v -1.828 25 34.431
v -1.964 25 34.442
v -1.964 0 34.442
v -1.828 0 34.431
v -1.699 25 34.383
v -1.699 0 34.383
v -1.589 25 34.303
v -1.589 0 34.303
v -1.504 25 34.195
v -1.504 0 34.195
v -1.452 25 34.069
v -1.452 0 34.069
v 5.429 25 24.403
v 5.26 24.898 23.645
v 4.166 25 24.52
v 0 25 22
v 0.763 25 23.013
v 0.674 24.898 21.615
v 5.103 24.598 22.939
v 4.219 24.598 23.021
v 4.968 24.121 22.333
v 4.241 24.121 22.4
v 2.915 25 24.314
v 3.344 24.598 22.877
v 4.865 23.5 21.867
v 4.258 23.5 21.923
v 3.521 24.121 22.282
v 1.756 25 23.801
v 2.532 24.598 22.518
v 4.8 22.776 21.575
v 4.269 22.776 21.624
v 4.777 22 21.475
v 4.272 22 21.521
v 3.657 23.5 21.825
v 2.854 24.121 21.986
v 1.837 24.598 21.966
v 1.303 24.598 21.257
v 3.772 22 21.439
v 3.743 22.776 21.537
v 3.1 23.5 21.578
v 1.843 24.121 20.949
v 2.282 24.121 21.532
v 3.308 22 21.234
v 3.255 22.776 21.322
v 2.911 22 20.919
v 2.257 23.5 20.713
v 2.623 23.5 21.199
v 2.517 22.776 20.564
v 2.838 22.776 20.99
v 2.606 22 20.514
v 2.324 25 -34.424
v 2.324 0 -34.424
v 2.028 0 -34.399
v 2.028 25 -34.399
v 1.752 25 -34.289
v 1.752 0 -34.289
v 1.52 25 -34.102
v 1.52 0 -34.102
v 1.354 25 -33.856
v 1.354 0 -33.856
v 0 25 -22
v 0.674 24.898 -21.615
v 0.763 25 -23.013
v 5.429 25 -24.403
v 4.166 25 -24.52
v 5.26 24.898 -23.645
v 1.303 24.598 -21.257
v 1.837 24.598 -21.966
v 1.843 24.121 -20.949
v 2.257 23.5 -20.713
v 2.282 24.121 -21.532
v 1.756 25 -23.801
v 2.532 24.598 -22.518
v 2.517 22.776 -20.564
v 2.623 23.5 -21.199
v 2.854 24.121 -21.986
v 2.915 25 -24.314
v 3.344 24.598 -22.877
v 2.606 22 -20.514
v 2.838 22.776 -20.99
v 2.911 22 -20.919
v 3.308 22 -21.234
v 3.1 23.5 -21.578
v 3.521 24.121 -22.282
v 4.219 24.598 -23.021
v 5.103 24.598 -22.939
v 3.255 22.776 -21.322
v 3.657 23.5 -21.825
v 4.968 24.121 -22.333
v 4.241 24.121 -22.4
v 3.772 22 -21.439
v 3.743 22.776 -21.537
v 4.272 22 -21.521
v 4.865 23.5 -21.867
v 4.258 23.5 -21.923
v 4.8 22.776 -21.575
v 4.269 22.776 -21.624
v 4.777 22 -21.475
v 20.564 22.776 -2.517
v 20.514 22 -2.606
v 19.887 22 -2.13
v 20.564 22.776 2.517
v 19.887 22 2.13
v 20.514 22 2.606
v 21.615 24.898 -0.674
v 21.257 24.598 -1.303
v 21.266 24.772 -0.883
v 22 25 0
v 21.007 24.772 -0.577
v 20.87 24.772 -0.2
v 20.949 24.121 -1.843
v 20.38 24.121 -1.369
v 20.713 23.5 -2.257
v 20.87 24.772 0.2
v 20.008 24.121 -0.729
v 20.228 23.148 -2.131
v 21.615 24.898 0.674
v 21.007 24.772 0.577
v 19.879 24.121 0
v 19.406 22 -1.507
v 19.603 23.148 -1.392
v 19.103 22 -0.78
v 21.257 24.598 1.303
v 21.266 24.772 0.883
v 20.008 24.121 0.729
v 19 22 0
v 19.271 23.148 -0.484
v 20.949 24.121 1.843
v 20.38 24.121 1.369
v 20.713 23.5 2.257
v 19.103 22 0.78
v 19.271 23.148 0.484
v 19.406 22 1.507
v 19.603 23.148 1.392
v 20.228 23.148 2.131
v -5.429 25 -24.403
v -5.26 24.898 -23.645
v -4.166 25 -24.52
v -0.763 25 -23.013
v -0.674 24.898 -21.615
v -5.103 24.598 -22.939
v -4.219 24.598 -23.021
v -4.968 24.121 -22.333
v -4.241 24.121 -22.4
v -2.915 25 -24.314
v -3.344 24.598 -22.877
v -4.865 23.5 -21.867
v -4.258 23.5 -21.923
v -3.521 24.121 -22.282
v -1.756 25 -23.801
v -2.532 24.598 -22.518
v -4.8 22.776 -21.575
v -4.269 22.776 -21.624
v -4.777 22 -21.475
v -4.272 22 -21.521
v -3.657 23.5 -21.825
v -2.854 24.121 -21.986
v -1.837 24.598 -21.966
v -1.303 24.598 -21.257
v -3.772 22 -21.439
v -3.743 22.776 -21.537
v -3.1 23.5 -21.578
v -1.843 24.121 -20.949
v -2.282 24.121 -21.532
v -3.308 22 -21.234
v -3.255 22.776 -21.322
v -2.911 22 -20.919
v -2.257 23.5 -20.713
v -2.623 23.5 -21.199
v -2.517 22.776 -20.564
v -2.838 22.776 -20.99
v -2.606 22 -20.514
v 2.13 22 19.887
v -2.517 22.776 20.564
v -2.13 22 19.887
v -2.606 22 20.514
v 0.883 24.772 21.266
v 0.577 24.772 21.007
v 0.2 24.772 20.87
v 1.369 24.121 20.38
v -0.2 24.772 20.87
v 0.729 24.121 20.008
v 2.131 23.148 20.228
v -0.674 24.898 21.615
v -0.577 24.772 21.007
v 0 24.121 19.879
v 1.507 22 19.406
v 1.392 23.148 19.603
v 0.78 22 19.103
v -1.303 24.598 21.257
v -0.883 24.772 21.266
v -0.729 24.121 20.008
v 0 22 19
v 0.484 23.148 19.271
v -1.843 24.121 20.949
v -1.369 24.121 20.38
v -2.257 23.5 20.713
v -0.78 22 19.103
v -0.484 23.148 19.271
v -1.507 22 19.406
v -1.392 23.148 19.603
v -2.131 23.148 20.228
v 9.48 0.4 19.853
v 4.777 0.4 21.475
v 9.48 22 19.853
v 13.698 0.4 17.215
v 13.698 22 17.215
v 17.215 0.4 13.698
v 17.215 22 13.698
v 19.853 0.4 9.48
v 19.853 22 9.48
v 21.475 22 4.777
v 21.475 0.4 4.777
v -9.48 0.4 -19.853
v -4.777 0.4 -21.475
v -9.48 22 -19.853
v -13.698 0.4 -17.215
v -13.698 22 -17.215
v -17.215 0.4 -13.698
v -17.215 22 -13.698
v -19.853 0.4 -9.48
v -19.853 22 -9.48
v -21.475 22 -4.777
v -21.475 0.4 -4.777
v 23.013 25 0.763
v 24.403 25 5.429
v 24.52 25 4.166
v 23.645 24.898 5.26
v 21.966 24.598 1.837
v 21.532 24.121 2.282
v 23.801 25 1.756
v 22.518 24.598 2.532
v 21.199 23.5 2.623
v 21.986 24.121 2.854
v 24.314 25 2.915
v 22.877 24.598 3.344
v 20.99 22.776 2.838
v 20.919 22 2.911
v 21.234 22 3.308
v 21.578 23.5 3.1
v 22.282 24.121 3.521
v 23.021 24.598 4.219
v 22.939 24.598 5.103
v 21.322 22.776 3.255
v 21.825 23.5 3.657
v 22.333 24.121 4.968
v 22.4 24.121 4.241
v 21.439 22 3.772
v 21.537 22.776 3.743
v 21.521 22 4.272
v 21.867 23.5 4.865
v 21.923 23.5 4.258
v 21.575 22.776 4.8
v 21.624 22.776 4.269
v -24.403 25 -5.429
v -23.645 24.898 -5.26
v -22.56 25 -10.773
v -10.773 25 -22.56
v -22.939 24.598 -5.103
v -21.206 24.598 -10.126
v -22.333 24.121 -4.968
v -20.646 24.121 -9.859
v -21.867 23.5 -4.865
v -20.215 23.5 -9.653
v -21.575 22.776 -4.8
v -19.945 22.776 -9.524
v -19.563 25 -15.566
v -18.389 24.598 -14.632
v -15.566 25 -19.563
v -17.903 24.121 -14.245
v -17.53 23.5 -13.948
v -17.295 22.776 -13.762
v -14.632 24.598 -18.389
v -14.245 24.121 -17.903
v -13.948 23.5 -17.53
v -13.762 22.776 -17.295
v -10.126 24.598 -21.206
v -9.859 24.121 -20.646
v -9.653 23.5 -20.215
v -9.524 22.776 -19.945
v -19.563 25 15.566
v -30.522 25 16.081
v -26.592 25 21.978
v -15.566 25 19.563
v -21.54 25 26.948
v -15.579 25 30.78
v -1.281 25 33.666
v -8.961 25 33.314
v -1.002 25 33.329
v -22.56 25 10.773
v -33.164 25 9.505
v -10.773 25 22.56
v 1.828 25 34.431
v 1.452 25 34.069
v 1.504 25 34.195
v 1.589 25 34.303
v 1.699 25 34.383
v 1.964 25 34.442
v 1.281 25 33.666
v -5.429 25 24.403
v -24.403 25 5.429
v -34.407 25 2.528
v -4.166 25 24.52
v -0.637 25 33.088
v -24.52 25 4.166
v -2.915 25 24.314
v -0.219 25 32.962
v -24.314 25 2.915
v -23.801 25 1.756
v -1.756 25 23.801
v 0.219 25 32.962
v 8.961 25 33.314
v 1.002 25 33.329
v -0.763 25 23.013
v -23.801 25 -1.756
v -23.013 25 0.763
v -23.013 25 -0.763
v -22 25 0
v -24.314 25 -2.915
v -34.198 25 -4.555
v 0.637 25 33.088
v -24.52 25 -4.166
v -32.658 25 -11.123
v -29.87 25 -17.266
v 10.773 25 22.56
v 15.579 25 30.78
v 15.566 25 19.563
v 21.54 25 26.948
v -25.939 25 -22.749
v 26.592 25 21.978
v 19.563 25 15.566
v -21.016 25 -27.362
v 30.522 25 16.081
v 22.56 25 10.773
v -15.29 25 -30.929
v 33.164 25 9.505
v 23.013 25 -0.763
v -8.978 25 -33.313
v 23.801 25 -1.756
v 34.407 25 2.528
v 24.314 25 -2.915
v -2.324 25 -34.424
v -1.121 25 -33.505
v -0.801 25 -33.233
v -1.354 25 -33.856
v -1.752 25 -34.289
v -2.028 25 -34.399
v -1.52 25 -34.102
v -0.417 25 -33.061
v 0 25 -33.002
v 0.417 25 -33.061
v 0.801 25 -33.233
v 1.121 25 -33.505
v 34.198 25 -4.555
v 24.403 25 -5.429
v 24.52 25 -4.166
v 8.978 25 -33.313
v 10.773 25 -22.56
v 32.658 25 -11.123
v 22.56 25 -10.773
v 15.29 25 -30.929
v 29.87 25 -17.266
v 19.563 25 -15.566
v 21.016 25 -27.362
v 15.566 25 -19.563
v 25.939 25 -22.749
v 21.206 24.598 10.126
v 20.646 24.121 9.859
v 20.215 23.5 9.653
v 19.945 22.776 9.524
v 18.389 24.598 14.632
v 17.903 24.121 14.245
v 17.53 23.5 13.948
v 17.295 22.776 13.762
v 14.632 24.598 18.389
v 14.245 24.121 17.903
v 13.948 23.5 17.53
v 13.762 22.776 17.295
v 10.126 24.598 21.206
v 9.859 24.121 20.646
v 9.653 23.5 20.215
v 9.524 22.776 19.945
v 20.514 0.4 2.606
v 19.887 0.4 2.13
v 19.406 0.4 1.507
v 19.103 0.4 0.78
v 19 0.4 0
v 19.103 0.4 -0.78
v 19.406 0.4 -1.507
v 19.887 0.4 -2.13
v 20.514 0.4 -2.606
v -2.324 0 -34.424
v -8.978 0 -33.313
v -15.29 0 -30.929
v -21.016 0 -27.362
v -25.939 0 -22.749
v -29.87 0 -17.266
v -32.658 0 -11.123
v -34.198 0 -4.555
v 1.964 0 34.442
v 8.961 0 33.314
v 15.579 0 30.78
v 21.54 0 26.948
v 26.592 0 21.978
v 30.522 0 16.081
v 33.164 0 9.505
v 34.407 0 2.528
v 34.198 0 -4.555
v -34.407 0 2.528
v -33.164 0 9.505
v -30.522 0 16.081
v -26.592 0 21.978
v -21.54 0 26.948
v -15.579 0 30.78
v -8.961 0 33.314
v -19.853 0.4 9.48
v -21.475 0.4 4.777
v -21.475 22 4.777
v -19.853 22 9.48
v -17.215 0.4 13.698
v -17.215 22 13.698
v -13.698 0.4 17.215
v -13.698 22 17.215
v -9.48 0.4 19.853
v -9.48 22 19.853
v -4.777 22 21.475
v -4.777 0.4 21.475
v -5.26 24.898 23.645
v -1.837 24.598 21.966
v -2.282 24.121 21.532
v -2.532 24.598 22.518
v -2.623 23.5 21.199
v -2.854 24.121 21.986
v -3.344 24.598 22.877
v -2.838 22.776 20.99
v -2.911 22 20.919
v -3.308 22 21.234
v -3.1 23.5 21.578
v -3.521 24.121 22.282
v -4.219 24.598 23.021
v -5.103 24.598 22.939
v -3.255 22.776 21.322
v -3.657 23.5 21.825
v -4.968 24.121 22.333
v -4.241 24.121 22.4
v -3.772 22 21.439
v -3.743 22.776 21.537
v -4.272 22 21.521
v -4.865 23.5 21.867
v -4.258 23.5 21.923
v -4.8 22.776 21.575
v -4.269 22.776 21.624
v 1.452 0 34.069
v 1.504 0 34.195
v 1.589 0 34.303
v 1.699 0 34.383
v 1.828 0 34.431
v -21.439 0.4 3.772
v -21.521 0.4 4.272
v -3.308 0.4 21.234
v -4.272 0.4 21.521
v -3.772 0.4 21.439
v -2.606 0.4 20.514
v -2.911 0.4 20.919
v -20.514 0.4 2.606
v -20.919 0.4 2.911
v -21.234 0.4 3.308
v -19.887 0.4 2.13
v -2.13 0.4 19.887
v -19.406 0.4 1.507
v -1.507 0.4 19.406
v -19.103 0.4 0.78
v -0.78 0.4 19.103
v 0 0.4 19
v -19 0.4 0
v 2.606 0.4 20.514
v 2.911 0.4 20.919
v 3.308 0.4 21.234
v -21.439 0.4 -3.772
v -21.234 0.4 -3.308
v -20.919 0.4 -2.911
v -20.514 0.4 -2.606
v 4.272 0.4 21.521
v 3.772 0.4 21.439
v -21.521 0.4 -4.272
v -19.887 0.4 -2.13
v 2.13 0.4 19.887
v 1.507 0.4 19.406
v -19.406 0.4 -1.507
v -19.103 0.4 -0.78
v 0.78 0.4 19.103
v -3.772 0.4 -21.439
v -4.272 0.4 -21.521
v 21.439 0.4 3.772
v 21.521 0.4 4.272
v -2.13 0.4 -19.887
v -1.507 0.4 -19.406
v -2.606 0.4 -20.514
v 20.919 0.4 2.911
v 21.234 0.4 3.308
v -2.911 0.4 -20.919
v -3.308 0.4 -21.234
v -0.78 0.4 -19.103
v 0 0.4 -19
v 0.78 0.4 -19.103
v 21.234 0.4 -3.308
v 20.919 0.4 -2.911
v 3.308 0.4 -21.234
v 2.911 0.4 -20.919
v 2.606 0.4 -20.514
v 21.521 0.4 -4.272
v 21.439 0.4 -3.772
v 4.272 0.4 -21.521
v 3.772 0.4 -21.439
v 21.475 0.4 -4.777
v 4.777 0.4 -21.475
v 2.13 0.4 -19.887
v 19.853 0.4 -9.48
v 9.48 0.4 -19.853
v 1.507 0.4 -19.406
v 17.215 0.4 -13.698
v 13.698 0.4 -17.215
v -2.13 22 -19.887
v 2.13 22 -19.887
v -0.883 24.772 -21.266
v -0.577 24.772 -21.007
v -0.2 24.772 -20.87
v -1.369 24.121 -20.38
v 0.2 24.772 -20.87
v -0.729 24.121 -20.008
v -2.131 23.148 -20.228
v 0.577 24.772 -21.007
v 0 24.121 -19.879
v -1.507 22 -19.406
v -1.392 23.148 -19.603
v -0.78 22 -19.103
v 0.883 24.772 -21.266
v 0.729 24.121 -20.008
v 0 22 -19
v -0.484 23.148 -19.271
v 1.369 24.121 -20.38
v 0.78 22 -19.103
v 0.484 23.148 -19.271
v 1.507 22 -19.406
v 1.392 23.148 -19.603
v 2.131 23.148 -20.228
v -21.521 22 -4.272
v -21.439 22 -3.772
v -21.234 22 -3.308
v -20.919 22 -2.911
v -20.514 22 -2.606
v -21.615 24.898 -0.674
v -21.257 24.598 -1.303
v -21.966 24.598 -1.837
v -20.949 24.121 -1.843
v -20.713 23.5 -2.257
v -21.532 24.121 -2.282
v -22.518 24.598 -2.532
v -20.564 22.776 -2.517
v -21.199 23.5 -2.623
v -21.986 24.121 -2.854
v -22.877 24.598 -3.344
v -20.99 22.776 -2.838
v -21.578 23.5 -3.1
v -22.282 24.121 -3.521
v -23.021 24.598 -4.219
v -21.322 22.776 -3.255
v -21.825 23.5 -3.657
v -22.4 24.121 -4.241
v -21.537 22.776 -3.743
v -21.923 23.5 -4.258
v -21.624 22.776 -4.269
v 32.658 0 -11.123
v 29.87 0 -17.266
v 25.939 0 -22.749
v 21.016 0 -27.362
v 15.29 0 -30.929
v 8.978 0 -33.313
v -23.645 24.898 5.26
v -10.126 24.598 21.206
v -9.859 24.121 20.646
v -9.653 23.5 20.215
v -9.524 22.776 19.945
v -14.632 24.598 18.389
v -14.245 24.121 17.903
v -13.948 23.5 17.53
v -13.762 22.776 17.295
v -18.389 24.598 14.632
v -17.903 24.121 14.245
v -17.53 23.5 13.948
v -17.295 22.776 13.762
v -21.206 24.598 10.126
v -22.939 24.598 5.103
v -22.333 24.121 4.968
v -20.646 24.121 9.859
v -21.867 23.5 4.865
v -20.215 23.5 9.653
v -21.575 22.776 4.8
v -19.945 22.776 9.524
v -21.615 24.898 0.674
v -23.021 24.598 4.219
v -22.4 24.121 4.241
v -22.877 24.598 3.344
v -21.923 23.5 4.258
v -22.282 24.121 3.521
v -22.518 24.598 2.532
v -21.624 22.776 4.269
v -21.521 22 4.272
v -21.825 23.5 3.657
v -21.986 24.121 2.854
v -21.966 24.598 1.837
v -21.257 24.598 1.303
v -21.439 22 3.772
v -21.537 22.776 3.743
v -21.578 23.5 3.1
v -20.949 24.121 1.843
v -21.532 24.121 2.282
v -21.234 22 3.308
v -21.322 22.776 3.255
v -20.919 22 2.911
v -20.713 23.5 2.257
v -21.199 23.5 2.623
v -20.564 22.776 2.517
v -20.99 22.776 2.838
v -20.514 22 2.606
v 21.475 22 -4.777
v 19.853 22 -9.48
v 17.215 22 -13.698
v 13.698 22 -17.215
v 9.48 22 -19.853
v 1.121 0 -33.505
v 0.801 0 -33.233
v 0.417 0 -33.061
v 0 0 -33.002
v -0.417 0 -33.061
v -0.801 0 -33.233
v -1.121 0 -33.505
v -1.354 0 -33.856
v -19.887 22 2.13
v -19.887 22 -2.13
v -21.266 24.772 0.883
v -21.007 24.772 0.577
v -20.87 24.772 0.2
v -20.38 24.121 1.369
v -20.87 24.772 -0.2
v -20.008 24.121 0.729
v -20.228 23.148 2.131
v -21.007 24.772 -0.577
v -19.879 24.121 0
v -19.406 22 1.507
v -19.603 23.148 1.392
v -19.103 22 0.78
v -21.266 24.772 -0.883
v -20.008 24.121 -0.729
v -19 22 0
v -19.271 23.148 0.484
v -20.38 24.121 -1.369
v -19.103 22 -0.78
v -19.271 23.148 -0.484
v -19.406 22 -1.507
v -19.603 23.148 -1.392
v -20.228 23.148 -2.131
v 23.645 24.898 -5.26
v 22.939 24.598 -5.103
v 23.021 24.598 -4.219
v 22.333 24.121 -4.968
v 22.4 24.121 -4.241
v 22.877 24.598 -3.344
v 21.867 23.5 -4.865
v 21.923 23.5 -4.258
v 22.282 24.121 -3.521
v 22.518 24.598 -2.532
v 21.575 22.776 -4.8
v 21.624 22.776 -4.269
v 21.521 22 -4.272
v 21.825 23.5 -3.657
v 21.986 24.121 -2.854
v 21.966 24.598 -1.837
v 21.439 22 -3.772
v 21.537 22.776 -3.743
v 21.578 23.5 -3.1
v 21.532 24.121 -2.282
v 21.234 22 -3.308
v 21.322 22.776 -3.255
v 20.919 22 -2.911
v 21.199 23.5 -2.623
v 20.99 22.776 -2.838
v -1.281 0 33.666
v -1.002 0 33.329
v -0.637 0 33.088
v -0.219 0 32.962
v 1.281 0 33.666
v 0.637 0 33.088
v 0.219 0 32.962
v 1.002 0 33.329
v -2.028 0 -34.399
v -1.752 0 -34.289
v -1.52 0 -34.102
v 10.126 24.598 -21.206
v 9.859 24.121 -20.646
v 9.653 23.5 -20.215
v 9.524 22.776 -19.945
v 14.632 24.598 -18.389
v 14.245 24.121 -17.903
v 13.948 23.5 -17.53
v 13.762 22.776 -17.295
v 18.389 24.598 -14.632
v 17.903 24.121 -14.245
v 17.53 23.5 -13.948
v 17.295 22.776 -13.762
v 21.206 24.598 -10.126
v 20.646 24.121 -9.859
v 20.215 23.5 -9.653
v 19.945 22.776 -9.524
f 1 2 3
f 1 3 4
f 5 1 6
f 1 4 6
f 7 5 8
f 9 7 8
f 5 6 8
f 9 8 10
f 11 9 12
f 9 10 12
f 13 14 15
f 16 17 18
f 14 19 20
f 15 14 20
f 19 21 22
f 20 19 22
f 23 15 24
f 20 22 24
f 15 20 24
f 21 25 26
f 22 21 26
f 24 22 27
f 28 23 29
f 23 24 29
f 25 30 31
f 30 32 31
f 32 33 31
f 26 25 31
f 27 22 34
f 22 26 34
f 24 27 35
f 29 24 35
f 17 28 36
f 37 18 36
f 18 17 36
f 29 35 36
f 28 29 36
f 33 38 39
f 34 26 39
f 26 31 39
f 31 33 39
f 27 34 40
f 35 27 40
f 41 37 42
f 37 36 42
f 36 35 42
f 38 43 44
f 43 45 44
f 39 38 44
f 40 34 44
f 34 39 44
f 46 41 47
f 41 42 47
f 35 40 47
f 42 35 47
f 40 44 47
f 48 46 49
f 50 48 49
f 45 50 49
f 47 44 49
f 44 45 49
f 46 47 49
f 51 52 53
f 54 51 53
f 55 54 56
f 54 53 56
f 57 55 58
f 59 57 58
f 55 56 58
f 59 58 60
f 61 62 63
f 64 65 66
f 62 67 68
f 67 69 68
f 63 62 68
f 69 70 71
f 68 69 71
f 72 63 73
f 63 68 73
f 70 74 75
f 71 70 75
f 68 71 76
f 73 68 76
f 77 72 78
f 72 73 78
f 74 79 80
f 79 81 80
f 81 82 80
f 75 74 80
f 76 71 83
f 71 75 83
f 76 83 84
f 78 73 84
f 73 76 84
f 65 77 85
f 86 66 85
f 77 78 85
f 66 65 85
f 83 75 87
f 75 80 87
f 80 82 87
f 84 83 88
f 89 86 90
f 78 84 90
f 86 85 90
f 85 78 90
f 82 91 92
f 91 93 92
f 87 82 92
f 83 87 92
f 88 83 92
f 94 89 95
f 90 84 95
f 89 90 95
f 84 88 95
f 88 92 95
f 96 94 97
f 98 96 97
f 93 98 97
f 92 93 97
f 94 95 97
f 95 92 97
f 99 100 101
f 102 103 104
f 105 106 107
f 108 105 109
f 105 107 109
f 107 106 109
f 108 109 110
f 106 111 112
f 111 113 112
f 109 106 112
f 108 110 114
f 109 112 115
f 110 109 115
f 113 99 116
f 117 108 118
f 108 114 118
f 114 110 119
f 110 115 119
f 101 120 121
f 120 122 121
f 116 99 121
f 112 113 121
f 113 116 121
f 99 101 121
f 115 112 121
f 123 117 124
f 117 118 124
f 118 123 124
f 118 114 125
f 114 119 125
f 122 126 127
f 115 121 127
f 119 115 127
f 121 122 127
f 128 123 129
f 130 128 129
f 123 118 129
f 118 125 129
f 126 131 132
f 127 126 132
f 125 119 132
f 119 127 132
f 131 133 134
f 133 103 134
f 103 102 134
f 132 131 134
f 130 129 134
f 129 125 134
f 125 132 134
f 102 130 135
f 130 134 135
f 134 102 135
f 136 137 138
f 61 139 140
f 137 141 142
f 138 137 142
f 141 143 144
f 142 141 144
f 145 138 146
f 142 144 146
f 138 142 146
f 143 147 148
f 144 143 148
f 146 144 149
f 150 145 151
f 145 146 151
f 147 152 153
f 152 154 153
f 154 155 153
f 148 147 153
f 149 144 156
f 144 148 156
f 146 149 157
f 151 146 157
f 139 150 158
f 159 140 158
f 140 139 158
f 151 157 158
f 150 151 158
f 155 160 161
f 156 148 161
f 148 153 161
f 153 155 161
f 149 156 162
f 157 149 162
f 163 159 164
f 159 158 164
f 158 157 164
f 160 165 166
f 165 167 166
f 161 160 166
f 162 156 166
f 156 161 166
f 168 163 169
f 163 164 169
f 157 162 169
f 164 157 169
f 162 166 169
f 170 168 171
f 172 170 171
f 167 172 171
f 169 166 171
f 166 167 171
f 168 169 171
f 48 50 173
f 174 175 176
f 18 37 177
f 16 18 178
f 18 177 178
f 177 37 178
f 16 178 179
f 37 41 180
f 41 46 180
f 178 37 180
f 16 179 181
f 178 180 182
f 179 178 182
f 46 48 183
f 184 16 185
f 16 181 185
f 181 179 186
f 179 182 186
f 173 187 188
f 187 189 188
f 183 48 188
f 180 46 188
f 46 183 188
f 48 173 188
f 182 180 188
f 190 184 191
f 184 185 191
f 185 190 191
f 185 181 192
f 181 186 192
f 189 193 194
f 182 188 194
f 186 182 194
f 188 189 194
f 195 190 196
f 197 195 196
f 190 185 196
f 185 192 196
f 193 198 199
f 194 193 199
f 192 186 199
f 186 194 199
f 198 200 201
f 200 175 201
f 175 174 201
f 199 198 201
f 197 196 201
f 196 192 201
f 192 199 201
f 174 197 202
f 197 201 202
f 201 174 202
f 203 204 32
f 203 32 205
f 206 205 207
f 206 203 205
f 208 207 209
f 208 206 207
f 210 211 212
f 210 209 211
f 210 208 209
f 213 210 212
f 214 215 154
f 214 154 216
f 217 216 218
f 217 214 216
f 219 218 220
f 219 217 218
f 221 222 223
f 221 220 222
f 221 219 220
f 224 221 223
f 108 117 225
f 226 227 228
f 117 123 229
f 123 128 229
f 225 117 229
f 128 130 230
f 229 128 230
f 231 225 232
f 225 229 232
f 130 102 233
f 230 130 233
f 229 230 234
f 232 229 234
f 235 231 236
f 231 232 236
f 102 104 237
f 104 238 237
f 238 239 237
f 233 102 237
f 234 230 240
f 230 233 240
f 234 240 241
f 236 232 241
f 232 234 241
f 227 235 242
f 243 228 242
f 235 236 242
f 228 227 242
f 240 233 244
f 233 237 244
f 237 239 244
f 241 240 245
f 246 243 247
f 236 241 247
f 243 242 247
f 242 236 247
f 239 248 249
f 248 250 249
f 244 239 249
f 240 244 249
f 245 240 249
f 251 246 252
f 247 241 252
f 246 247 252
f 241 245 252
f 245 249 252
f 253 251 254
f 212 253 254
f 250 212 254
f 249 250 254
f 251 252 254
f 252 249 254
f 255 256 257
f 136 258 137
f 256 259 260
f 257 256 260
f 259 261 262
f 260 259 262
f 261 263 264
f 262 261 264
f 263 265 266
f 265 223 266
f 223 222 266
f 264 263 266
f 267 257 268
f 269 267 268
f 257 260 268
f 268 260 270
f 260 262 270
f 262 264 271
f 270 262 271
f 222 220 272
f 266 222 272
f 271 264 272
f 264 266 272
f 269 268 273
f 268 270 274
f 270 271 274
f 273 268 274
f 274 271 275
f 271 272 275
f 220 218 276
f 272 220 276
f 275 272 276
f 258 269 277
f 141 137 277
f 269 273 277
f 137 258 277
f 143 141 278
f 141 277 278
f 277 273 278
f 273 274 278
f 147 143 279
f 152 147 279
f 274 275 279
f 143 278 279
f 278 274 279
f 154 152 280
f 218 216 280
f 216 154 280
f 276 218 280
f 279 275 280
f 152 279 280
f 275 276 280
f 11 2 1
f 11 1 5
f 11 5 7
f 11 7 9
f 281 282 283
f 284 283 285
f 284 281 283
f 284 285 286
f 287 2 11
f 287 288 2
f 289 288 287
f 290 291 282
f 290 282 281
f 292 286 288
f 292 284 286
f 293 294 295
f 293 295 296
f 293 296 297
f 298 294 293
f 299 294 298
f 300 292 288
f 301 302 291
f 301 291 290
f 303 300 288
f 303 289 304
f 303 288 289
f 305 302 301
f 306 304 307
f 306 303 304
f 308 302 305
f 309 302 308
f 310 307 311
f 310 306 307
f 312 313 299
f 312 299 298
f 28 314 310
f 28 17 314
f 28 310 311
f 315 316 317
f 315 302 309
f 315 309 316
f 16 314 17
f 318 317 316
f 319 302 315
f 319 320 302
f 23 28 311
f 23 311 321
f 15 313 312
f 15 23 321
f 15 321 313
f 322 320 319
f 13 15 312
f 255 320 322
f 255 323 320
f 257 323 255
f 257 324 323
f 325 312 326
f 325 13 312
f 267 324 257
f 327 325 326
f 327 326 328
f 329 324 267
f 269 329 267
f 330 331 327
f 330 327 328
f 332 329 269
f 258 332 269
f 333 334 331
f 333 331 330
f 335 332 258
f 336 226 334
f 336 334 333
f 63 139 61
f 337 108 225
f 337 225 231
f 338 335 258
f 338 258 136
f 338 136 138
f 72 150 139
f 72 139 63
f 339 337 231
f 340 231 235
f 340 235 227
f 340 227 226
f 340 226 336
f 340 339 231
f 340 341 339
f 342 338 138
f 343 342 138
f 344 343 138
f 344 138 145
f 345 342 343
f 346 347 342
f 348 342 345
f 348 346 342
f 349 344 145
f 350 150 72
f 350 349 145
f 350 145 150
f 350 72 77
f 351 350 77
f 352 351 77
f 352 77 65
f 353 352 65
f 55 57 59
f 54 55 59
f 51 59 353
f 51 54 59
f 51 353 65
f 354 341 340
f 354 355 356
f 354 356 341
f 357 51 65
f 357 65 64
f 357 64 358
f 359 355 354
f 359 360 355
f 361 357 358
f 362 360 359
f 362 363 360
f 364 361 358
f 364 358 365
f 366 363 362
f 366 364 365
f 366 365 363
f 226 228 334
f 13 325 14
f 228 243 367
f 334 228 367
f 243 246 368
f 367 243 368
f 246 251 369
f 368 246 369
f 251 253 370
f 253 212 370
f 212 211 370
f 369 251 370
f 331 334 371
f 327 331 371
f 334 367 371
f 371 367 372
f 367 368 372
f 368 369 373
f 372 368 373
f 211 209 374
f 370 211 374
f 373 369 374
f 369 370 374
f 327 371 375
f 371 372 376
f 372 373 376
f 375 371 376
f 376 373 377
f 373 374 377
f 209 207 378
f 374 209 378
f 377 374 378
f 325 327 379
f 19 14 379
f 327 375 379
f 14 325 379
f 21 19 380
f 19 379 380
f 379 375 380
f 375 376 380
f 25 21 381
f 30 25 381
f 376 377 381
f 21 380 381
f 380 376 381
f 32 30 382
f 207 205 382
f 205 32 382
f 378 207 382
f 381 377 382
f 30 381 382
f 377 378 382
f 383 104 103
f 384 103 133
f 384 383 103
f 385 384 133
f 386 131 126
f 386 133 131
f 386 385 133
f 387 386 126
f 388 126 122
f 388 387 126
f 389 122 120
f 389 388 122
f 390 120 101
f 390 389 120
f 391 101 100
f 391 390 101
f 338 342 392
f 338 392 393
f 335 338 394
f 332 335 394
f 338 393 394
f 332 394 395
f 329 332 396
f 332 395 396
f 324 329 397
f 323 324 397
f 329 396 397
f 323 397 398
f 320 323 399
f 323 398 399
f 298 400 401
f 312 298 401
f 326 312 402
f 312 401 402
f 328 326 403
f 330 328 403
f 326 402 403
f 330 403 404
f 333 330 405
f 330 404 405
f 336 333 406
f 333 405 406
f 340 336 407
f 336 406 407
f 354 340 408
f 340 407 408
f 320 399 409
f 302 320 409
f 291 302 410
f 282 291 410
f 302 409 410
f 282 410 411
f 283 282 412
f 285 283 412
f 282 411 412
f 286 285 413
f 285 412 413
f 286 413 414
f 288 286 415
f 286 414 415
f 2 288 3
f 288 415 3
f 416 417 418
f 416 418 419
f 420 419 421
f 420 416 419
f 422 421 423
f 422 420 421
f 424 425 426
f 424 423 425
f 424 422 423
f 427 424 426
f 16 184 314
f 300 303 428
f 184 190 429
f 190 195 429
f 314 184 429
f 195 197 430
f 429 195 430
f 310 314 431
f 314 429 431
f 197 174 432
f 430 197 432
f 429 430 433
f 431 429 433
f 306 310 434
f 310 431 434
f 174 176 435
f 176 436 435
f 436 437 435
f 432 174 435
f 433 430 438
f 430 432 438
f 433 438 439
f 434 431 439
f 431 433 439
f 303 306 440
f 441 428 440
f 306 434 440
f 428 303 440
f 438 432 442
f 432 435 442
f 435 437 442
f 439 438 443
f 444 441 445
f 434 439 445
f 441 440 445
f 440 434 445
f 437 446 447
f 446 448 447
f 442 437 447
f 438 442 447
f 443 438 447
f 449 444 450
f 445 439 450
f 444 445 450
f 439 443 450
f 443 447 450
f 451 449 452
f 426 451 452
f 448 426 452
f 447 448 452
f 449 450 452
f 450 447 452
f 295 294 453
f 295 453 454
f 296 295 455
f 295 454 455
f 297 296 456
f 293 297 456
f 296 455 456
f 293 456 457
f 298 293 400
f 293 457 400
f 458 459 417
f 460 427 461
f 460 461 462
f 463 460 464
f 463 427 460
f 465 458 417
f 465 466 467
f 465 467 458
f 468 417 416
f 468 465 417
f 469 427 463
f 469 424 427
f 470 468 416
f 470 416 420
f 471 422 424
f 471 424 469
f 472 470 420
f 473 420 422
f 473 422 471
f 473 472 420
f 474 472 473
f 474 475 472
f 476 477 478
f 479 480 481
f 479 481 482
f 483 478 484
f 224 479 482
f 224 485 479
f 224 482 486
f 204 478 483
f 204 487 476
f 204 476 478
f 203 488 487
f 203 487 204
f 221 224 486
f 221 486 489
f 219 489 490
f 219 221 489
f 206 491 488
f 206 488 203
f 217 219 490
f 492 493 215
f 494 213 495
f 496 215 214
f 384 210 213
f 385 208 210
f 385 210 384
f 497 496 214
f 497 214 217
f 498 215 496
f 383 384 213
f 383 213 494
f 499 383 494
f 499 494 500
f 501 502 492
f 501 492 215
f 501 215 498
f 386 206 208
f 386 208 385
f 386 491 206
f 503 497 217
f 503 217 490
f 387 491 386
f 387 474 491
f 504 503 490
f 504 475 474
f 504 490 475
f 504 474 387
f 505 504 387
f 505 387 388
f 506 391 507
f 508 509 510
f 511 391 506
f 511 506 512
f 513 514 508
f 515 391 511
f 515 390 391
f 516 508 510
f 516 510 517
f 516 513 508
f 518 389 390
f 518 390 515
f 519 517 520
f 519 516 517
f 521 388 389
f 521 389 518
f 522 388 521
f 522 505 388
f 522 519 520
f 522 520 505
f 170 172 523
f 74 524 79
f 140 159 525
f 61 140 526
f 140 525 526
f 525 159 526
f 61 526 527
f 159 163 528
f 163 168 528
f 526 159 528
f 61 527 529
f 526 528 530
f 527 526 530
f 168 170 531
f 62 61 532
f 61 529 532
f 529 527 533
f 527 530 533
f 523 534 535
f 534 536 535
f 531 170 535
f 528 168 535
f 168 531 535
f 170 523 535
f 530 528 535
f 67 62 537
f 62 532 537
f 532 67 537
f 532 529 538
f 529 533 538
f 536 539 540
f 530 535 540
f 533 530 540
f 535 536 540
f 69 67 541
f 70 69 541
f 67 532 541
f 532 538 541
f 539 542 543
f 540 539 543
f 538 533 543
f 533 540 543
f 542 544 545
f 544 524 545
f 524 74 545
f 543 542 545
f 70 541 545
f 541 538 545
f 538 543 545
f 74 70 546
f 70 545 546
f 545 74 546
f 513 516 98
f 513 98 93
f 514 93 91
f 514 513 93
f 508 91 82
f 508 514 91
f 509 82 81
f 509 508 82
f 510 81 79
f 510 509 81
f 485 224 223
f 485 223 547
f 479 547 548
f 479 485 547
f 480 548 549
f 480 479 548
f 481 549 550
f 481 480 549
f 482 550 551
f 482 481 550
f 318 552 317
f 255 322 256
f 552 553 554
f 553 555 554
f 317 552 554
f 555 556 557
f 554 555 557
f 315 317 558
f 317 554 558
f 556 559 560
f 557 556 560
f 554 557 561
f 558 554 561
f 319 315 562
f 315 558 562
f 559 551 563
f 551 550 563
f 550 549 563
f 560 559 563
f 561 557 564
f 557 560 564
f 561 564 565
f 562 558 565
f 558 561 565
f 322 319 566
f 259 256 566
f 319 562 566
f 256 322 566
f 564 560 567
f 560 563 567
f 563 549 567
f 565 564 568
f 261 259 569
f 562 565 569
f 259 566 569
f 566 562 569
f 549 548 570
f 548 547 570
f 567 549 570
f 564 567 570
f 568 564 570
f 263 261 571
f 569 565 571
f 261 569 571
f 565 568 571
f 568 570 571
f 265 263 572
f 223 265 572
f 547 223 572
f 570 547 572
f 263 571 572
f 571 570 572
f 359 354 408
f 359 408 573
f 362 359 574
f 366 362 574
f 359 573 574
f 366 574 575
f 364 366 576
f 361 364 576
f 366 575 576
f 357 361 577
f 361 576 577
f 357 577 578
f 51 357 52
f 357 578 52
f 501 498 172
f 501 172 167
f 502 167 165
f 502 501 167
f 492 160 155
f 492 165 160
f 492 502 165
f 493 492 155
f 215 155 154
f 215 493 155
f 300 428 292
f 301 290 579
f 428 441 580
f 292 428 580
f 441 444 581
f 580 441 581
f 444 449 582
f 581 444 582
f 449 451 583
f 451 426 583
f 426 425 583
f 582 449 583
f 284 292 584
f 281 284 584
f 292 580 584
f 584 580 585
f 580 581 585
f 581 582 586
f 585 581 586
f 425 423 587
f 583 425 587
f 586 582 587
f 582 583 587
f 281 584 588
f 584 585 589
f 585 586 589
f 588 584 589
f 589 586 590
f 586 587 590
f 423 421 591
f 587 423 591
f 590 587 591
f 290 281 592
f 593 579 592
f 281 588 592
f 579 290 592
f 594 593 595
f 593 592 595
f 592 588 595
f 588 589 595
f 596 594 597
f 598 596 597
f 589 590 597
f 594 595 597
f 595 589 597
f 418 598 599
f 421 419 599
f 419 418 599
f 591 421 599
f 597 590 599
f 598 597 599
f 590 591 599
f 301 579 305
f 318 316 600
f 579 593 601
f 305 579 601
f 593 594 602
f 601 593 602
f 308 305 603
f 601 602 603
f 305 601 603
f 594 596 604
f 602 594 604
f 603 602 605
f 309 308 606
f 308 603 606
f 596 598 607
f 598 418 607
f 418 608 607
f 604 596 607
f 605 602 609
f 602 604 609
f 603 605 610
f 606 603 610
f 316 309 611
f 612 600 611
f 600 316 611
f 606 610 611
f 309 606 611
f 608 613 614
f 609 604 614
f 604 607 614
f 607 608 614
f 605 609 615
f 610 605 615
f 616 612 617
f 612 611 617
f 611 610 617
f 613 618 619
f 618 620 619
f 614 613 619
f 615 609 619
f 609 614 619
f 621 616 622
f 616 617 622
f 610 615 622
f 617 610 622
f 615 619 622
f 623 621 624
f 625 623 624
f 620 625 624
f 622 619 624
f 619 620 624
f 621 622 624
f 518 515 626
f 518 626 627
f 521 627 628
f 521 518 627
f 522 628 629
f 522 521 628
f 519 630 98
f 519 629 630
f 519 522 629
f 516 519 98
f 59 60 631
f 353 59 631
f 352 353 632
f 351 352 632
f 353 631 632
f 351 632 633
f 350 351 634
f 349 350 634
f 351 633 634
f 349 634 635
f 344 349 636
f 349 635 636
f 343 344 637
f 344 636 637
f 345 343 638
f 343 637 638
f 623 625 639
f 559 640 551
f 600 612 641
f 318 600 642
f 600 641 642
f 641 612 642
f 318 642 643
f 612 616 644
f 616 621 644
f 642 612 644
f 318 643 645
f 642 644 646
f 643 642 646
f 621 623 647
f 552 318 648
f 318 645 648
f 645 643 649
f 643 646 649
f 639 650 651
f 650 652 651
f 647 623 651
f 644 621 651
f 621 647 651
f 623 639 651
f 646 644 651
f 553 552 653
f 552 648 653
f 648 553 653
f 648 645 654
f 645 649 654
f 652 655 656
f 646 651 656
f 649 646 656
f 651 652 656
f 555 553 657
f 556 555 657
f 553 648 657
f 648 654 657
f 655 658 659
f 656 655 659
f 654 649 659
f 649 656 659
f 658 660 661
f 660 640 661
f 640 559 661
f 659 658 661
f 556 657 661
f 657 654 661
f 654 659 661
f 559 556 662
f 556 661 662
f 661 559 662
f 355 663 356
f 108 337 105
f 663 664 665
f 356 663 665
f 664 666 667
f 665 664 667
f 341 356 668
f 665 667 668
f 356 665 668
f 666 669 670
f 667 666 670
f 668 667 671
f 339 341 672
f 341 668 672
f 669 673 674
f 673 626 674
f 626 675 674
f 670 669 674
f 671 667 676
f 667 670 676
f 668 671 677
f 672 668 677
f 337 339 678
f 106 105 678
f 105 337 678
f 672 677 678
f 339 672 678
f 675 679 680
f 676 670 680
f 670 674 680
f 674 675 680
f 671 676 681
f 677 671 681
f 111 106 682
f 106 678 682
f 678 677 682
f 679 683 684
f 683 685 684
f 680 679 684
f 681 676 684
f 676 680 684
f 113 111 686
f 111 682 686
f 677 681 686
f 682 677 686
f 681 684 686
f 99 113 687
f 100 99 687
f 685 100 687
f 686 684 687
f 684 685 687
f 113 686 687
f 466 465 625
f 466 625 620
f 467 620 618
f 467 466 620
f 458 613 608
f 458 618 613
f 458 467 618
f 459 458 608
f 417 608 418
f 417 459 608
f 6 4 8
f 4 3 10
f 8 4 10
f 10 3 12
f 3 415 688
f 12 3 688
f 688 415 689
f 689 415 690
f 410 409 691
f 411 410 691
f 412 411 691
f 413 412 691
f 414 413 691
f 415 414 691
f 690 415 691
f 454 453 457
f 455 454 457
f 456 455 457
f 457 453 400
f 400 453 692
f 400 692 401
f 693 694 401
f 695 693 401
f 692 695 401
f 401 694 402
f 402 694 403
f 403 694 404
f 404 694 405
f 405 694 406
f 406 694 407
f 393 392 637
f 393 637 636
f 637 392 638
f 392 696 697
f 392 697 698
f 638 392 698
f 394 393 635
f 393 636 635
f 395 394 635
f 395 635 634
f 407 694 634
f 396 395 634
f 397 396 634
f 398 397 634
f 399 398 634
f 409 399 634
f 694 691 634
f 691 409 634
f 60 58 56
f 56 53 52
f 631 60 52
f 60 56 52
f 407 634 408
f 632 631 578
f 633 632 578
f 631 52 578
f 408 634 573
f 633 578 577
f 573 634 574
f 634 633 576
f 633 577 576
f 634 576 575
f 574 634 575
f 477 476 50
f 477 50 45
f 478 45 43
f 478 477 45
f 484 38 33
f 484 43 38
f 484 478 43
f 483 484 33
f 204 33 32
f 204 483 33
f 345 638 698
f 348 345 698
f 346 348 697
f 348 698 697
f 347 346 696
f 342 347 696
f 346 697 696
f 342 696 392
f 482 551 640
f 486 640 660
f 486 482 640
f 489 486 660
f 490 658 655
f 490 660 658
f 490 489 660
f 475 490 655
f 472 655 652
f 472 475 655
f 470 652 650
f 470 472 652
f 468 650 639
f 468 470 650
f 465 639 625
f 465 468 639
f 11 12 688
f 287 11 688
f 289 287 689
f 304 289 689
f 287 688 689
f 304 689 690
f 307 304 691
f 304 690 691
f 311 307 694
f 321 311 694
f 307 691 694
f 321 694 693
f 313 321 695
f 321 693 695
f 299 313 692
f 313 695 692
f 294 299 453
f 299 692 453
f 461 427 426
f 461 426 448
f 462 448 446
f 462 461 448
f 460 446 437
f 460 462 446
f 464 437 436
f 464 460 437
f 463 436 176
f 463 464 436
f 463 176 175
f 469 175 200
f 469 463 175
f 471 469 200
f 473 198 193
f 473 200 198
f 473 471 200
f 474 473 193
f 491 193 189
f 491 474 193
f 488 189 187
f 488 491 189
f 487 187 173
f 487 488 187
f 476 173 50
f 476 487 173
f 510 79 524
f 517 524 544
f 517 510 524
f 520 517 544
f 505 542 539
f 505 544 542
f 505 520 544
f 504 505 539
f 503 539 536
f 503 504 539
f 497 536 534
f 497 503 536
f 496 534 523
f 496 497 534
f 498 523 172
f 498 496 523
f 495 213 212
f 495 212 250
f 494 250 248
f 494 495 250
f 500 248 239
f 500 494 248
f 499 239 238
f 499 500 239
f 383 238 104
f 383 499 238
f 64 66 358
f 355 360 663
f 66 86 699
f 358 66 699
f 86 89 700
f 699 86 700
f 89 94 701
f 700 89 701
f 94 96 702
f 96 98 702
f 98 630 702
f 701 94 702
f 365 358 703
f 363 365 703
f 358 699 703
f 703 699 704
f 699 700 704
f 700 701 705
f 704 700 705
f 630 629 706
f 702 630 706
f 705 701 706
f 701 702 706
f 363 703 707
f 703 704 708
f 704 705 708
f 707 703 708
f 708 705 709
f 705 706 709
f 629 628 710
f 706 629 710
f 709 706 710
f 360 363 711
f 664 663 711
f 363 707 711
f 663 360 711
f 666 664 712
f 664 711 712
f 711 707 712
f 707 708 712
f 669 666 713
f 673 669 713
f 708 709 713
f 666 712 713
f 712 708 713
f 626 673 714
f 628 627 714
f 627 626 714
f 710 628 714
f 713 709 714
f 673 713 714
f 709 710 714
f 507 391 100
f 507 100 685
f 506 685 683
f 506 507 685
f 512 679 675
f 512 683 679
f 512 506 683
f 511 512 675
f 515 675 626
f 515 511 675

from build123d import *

# Parameters (mm, degrees)
BOSS_EXTRUDE1_DEPTH = 25
CUT_EXTRUDE2_DEPTH  = 26
BOSS_EXTRUDE2_DEPTH = 0.4
FILLET1_R           = 3


with BuildPart() as part:
    # Sketch1 → Boss-Extrude1 (new body)
    with BuildSketch(Plane(origin=(0, 0, 0), x_dir=(1, 0, 0), z_dir=(0, 1, 0))):
        with BuildLine():
            ThreePointArc((1.451818925, -34.068556857), (1.641248992, -34.346908706), (1.964225605, -34.442038138))
            ThreePointArc((1.964225605, -34.442038138), (26.591847487, -21.978073076), (34.198225299, 4.555174015))
            ThreePointArc((34.198225299, 4.555174015), (23.590291339, 25.176355888), (2.324135821, 34.423627607))
            ThreePointArc((2.324135821, 34.423627607), (1.751838249, 34.289058819), (1.354061739, 33.856153382))
            ThreePointArc((1.354061739, 33.856153382), (0, 33.001534515), (-1.354061739, 33.856153382))
            ThreePointArc((-1.354061739, 33.856153382), (-1.751838249, 34.289058819), (-2.324135821, 34.423627607))
            ThreePointArc((-2.324135821, 34.423627607), (-23.590291339, 25.176355888), (-34.198225299, 4.555174015))
            ThreePointArc((-34.198225299, 4.555174015), (-26.591847487, -21.978073076), (-1.964225605, -34.442038138))
            ThreePointArc((-1.964225605, -34.442038138), (-1.641248992, -34.346908706), (-1.451818925, -34.068556857))
            ThreePointArc((-1.451818925, -34.068556857), (0, -32.945679925), (1.451818925, -34.068556857))
        make_face()
        with BuildLine():
            Line((-2.417, 3.787737139), (0, 3.787737139))
            Line((0, 3.787737139), (2.417, 3.787737139))
            ThreePointArc((2.417, 3.787737139), (0, -4.489512172), (-2.417, 3.787737139))
        make_face(mode=Mode.SUBTRACT)
    extrude(amount=BOSS_EXTRUDE1_DEPTH)

    # Sketch2 → Cut-Extrude2 (cut, through all)
    with BuildSketch(Plane(origin=(0, 0, 0), x_dir=(1, 0, 0), z_dir=(0, 1, 0))):
        with BuildLine():
            ThreePointArc((-21.475, -4.777486264), (-15.556349186, -15.556349186), (-4.777486264, -21.475))
            ThreePointArc((-4.777486264, -21.475), (-3.533555097, -21.35153147), (-2.605901598, -20.513636364))
            ThreePointArc((-2.605901598, -20.513636364), (0, -19), (2.605901598, -20.513636364))
            ThreePointArc((2.605901598, -20.513636364), (3.533555097, -21.35153147), (4.777486264, -21.475))
            ThreePointArc((4.777486264, -21.475), (15.556349186, -15.556349186), (21.475, -4.777486264))
            ThreePointArc((21.475, -4.777486264), (21.35153147, -3.533555097), (20.513636364, -2.605901598))
            ThreePointArc((20.513636364, -2.605901598), (19, 0), (20.513636364, 2.605901598))
            ThreePointArc((20.513636364, 2.605901598), (21.35153147, 3.533555097), (21.475, 4.777486264))
            ThreePointArc((21.475, 4.777486264), (15.556349186, 15.556349186), (4.777486264, 21.475))
            ThreePointArc((4.777486264, 21.475), (3.533555097, 21.35153147), (2.605901598, 20.513636364))
            ThreePointArc((2.605901598, 20.513636364), (0, 19), (-2.605901598, 20.513636364))
            ThreePointArc((-2.605901598, 20.513636364), (-3.533555097, 21.35153147), (-4.777486264, 21.475))
            ThreePointArc((-4.777486264, 21.475), (-15.556349186, 15.556349186), (-21.475, 4.777486264))
            ThreePointArc((-21.475, 4.777486264), (-21.35153147, 3.533555097), (-20.513636364, 2.605901598))
            ThreePointArc((-20.513636364, 2.605901598), (-19, 0), (-20.513636364, -2.605901598))
            ThreePointArc((-20.513636364, -2.605901598), (-21.35153147, -3.533555097), (-21.475, -4.777486264))
        make_face()
    extrude(amount=CUT_EXTRUDE2_DEPTH, mode=Mode.SUBTRACT)

    # Sketch2<2> → Boss-Extrude2 (add)
    with BuildSketch(Plane(origin=(0, 0, 0), x_dir=(1, 0, 0), z_dir=(0, 1, 0))):
        with BuildLine():
            ThreePointArc((-21.475, -4.777486264), (-15.556349186, -15.556349186), (-4.777486264, -21.475))
            ThreePointArc((-4.777486264, -21.475), (-3.533555097, -21.35153147), (-2.605901598, -20.513636364))
            ThreePointArc((-2.605901598, -20.513636364), (0, -19), (2.605901598, -20.513636364))
            ThreePointArc((2.605901598, -20.513636364), (3.533555097, -21.35153147), (4.777486264, -21.475))
            ThreePointArc((4.777486264, -21.475), (15.556349186, -15.556349186), (21.475, -4.777486264))
            ThreePointArc((21.475, -4.777486264), (21.35153147, -3.533555097), (20.513636364, -2.605901598))
            ThreePointArc((20.513636364, -2.605901598), (19, 0), (20.513636364, 2.605901598))
            ThreePointArc((20.513636364, 2.605901598), (21.35153147, 3.533555097), (21.475, 4.777486264))
            ThreePointArc((21.475, 4.777486264), (15.556349186, 15.556349186), (4.777486264, 21.475))
            ThreePointArc((4.777486264, 21.475), (3.533555097, 21.35153147), (2.605901598, 20.513636364))
            ThreePointArc((2.605901598, 20.513636364), (0, 19), (-2.605901598, 20.513636364))
            ThreePointArc((-2.605901598, 20.513636364), (-3.533555097, 21.35153147), (-4.777486264, 21.475))
            ThreePointArc((-4.777486264, 21.475), (-15.556349186, 15.556349186), (-21.475, 4.777486264))
            ThreePointArc((-21.475, 4.777486264), (-21.35153147, 3.533555097), (-20.513636364, 2.605901598))
            ThreePointArc((-20.513636364, 2.605901598), (-19, 0), (-20.513636364, -2.605901598))
            ThreePointArc((-20.513636364, -2.605901598), (-21.35153147, -3.533555097), (-21.475, -4.777486264))
        make_face()
    extrude(amount=BOSS_EXTRUDE2_DEPTH)

    # Fillet1
    fillet1_edges = [part.edges().sort_by_distance(p)[0] for p in [
        (-21.35153147, 25, 3.533555097),
        (-15.556349186, 25, 15.556349186),
        (-3.533555097, 25, 21.35153147),
        (0, 25, 19),
        (3.533555097, 25, 21.35153147),
        (15.556349186, 25, 15.556349186),
        (21.35153147, 25, 3.533555097),
        (19, 25, 0),
        (21.35153147, 25, -3.533555097),
        (15.556349186, 25, -15.556349186),
        (3.533555097, 25, -21.35153147),
        (0, 25, -19),
        (-3.533555097, 25, -21.35153147),
        (-15.556349186, 25, -15.556349186),
        (-21.35153147, 25, -3.533555097),
        (-19, 25, 0),
    ]]
    fillet(fillet1_edges, radius=FILLET1_R)


solid = part.part
